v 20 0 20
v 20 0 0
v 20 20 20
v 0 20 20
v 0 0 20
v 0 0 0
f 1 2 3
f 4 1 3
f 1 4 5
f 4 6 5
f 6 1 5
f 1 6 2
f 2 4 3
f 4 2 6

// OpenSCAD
intersection() {
//difference() {
	cube(20);
	rotate([45, 0, 0]) {
		cube(40);
	}
}
